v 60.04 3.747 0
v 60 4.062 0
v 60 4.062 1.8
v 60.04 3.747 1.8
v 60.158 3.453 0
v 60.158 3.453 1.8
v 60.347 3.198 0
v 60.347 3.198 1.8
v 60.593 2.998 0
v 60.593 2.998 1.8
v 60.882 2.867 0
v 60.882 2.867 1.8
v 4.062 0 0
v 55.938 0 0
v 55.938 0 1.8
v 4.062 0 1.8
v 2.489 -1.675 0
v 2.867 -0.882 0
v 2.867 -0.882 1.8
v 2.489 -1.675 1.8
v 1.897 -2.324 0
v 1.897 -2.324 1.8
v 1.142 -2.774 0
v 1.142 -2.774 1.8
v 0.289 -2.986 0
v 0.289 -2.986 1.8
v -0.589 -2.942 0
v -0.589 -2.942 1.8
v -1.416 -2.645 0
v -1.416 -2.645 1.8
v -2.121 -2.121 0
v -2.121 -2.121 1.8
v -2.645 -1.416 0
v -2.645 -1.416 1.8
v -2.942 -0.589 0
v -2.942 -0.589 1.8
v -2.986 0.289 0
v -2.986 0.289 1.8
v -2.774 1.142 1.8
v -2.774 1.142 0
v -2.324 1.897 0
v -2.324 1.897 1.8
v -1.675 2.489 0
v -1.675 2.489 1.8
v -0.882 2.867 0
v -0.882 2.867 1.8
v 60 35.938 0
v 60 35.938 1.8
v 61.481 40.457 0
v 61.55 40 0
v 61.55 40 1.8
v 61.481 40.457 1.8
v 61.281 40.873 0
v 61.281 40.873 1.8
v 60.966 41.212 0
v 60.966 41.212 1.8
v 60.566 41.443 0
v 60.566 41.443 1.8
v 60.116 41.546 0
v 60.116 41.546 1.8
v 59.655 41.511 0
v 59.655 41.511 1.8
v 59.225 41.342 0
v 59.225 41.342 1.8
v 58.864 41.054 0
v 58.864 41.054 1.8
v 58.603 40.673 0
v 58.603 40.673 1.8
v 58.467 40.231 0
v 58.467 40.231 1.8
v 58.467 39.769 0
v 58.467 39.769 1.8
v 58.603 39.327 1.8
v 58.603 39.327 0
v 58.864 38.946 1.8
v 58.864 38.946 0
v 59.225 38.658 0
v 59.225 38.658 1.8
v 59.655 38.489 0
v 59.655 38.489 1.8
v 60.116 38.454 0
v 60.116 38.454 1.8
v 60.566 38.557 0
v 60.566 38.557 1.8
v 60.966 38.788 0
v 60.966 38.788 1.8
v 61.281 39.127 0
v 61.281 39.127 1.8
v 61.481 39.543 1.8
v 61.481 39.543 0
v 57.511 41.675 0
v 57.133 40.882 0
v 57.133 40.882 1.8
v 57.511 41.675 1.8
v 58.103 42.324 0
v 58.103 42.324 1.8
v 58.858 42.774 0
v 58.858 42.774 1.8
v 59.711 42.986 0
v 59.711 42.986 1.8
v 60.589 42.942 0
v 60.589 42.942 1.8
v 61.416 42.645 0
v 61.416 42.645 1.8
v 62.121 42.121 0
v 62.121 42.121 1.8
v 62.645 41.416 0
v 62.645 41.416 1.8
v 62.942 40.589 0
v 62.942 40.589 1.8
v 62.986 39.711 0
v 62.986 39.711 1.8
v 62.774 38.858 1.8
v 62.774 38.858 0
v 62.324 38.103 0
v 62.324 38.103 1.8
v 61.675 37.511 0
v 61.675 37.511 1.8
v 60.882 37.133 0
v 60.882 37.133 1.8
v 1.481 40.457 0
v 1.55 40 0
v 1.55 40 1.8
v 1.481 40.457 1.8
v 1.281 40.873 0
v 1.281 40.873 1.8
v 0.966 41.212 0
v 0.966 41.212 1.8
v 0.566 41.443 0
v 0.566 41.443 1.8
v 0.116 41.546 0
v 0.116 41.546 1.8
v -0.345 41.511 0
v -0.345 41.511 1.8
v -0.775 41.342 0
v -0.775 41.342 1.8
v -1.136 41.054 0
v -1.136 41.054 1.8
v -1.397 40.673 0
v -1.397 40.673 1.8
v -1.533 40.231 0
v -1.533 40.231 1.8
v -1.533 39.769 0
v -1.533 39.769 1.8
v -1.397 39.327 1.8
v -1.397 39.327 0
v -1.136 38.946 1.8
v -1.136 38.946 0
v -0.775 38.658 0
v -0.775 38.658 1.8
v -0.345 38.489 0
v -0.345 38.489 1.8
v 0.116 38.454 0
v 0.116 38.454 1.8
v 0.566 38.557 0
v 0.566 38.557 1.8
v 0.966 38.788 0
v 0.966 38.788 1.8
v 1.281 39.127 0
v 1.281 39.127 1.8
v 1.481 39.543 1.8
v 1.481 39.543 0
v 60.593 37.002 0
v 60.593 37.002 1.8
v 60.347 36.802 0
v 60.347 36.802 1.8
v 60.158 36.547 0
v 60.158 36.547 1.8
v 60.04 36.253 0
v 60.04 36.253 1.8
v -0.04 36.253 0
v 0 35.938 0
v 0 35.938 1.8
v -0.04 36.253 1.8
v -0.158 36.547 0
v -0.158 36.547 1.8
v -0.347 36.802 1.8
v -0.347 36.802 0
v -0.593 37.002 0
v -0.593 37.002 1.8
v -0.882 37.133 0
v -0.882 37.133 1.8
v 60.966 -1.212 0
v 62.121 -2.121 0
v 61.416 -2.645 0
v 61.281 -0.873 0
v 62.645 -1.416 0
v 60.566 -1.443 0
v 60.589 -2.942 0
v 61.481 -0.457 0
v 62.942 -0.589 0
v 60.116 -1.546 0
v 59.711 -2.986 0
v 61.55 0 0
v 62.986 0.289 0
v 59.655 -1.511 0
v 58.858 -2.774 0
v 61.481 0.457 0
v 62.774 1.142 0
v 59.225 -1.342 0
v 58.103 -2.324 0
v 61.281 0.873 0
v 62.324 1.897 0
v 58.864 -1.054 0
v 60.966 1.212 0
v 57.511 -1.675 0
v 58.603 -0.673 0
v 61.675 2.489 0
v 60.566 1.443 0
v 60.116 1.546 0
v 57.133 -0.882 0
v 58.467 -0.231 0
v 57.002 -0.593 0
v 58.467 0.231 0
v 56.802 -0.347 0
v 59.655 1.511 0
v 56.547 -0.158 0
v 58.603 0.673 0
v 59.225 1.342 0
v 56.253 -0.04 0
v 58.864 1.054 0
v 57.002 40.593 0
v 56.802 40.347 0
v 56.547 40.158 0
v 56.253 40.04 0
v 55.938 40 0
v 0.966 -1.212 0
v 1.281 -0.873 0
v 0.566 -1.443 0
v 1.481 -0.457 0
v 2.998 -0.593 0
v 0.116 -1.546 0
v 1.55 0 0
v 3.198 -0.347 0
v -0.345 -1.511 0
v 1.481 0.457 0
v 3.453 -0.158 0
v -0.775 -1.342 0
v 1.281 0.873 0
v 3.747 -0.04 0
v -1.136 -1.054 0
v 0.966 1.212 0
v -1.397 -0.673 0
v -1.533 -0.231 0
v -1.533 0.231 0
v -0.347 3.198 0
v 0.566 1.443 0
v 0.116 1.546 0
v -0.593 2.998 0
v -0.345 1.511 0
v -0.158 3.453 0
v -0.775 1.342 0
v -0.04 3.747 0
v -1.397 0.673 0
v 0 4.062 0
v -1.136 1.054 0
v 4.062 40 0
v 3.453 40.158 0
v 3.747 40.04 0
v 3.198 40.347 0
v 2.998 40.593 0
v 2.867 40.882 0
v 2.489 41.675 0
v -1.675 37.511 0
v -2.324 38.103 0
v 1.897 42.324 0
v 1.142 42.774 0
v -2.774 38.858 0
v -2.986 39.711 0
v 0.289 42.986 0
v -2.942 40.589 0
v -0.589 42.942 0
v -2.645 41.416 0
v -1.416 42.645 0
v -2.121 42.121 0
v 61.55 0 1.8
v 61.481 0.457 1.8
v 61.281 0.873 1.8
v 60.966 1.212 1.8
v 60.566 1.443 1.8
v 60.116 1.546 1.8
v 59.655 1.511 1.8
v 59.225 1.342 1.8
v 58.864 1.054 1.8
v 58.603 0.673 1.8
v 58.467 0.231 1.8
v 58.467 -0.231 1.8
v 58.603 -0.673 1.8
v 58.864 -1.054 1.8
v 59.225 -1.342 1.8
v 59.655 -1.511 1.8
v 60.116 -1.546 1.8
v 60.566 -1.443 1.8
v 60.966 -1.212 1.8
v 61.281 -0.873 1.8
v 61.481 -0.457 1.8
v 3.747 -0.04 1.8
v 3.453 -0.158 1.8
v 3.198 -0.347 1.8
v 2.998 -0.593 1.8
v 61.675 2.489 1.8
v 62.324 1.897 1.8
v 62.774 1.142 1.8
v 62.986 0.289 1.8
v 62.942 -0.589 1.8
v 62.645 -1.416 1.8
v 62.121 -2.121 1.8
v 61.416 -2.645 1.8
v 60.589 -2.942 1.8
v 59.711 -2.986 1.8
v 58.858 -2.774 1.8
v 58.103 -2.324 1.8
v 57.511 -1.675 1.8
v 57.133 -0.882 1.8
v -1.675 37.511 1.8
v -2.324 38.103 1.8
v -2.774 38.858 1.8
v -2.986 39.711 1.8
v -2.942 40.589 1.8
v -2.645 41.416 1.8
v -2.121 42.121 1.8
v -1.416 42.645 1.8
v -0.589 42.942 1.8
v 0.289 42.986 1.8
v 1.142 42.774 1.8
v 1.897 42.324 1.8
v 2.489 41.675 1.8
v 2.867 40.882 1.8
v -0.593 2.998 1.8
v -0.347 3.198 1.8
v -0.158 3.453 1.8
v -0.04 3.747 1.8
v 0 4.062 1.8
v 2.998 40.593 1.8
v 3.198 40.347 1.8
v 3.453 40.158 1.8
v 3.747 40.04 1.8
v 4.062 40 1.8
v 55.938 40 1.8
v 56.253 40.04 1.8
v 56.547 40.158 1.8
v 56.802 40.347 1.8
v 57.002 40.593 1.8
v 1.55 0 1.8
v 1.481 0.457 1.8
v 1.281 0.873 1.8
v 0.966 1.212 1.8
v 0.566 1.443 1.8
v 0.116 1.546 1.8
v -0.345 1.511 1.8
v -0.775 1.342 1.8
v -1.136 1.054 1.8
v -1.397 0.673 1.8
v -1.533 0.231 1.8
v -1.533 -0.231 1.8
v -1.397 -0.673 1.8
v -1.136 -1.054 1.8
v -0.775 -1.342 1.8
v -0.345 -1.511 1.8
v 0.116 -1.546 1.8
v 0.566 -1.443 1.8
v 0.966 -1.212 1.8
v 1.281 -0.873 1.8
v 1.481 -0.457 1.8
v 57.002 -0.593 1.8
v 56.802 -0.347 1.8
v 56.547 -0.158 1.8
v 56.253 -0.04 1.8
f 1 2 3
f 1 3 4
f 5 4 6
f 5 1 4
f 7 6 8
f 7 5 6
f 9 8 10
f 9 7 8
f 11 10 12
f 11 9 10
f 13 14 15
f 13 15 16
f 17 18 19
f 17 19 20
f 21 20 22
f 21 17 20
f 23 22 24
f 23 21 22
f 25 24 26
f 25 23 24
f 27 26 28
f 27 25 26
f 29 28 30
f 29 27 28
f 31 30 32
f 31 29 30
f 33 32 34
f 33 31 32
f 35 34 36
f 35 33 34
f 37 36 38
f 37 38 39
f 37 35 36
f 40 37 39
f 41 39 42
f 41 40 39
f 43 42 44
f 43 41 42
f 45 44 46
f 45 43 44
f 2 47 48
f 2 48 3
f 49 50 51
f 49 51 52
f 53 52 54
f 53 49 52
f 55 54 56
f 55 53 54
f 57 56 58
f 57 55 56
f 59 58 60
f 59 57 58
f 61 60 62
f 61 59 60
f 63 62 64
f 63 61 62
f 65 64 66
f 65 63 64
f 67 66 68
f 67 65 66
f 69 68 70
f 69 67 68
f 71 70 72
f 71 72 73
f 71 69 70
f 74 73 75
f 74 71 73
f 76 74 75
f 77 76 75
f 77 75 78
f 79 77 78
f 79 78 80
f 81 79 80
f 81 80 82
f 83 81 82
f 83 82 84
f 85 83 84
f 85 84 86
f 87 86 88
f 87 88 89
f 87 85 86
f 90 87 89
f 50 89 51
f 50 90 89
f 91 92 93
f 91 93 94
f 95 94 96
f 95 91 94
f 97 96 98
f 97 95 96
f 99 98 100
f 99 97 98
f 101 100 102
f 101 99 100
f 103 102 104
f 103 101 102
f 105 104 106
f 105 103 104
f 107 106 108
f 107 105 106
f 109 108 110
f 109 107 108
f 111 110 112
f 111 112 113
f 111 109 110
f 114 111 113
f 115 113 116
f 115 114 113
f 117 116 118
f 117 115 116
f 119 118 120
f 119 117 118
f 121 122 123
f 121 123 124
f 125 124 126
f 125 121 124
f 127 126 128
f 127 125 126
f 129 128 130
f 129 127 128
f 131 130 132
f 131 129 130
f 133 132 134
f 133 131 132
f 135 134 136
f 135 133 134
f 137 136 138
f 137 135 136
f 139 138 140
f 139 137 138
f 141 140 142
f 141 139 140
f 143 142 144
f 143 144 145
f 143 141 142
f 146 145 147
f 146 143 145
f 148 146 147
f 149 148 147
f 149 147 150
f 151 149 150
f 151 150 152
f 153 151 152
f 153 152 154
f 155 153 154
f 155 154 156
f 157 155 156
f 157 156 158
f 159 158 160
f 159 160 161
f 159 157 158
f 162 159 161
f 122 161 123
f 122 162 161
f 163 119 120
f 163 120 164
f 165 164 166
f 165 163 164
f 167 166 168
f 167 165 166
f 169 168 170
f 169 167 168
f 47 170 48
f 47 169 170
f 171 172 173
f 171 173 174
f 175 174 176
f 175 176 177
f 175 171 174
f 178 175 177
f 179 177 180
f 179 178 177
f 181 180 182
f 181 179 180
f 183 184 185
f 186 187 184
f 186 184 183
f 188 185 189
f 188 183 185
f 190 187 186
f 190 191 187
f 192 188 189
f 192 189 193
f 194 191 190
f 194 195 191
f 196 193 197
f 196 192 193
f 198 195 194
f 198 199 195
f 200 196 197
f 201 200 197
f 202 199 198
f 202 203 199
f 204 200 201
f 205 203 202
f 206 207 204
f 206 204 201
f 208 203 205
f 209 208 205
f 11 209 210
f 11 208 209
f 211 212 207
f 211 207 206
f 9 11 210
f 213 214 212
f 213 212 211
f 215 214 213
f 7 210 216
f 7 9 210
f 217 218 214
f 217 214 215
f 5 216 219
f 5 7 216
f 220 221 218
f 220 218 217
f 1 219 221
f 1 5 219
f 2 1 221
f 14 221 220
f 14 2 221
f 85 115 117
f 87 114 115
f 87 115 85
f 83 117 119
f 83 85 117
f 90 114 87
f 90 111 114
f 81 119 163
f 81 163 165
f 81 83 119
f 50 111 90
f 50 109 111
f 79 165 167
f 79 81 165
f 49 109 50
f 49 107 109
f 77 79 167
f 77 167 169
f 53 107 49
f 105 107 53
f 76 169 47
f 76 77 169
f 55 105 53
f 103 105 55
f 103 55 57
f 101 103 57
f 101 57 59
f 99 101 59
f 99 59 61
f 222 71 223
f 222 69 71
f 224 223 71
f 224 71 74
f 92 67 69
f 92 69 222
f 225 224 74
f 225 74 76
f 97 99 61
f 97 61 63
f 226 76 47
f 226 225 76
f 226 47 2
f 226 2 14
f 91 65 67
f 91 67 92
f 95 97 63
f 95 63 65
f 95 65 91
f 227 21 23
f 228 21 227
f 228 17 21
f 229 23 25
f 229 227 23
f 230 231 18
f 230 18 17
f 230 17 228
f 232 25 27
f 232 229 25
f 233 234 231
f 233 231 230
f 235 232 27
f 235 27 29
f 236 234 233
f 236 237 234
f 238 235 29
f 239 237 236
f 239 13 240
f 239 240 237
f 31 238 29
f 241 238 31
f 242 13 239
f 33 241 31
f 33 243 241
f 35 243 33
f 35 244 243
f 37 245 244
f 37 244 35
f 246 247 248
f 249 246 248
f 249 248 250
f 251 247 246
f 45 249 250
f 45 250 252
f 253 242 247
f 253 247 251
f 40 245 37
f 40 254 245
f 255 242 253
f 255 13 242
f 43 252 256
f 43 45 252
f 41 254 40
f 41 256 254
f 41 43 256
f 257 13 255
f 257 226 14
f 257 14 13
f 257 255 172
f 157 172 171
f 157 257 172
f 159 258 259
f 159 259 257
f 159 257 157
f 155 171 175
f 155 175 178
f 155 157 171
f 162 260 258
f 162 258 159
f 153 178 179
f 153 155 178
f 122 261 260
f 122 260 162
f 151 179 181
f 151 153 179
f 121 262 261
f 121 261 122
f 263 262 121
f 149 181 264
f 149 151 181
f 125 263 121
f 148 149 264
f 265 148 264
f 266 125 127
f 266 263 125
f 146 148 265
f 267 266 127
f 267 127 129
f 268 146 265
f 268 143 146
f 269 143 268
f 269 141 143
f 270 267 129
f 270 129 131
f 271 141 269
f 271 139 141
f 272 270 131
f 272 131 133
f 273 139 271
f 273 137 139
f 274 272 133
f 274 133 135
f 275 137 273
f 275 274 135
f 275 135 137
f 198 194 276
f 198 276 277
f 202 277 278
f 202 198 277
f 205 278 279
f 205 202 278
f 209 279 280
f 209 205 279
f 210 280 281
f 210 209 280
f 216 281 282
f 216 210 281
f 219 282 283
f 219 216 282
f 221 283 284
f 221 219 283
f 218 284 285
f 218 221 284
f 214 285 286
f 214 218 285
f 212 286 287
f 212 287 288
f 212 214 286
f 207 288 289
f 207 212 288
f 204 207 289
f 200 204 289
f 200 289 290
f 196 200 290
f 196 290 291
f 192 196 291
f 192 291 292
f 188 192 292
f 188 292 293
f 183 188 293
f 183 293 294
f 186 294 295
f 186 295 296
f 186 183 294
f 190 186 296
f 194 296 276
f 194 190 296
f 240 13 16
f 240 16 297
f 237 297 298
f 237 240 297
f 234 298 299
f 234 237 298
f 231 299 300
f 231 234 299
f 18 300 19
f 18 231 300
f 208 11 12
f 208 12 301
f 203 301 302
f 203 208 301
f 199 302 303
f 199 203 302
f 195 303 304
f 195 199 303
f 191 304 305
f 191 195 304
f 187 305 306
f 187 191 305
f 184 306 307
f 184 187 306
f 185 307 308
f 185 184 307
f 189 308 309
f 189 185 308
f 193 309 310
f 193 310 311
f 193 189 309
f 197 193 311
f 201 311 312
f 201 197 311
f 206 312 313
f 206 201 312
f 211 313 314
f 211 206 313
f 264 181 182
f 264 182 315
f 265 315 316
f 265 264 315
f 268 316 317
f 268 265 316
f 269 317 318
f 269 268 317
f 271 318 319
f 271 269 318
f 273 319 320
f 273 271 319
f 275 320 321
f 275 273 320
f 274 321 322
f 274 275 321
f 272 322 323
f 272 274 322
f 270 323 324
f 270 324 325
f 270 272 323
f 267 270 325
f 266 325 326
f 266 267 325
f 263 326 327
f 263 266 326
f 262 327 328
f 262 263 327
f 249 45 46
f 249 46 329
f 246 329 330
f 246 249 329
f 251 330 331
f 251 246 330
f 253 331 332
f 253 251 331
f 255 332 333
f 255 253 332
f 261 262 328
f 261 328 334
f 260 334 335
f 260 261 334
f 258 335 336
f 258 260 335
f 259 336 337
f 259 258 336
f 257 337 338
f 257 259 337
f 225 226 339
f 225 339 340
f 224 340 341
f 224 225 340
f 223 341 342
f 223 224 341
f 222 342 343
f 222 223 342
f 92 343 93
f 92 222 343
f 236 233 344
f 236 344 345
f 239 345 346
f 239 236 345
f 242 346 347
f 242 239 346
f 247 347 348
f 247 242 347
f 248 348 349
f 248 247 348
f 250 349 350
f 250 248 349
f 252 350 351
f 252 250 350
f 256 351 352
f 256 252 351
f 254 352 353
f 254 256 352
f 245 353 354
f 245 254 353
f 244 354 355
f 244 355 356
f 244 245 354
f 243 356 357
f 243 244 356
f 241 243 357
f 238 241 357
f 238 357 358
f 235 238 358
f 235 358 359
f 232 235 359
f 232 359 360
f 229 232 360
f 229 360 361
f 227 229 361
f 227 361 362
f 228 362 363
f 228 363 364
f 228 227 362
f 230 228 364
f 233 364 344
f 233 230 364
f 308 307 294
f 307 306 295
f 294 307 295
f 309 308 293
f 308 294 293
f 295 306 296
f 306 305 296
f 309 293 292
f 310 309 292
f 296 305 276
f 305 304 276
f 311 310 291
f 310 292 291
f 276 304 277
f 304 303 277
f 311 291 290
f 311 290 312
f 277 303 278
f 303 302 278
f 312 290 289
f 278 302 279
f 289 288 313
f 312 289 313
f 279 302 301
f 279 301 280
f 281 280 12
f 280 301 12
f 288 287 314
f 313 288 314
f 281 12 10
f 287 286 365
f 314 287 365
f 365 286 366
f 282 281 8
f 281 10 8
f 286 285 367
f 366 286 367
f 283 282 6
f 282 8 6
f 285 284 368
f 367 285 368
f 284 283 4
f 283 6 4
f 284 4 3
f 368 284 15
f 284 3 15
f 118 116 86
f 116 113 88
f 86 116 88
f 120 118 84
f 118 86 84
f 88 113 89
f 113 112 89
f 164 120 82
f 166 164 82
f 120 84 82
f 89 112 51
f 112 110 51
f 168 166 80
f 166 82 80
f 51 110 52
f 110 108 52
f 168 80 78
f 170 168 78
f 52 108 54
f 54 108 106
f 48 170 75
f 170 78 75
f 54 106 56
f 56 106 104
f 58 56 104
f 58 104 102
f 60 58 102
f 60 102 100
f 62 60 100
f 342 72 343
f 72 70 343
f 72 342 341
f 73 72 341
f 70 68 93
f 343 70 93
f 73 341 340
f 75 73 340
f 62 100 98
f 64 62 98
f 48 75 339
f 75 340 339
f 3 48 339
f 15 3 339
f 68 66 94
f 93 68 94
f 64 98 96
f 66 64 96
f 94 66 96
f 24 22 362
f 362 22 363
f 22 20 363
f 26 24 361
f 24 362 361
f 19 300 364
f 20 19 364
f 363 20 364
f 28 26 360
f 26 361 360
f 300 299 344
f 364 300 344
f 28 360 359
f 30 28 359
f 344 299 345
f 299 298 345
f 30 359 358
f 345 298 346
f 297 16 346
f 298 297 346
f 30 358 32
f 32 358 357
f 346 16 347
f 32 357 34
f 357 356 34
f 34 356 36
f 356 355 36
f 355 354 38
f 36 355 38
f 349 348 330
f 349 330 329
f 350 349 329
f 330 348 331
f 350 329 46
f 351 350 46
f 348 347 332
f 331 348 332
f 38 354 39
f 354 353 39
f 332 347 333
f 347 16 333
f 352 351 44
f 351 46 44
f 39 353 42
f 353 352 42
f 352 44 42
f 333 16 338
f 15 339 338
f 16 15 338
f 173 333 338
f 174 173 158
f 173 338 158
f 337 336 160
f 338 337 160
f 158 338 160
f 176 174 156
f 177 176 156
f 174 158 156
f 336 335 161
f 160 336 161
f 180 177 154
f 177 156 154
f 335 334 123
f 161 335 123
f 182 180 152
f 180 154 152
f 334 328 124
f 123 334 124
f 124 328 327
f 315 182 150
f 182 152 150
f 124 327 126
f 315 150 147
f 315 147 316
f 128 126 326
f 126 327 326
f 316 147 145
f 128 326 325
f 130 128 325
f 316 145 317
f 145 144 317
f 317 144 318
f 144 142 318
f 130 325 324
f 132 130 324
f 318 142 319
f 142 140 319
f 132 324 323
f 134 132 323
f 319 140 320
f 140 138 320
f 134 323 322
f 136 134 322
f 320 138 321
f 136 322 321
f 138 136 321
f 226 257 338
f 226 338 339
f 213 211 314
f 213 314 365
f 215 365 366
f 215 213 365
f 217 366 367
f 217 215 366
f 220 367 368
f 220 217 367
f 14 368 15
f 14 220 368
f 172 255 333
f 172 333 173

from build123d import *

# Parameters (mm, degrees)
SKETCH_1_R      = 1.55
EXTRUDE_1_DEPTH = 1.8


with BuildPart() as part:
    # 草图1 → 凸台-拉伸1 (new body)
    with BuildSketch(Plane.XY):
        with BuildLine():
            ThreePointArc((0, 35.937980798), (-0.244500417, 36.680591455), (-0.882352941, 37.132692328))
            ThreePointArc((-0.882352941, 37.132692328), (-2.121320344, 42.121320344), (2.867307672, 40.882352941))
            ThreePointArc((2.867307672, 40.882352941), (3.319408545, 40.244500417), (4.062019202, 40))
            Line((4.062019202, 40), (55.937980798, 40))
            ThreePointArc((55.937980798, 40), (56.680591455, 40.244500417), (57.132692328, 40.882352941))
            ThreePointArc((57.132692328, 40.882352941), (62.121320344, 42.121320344), (60.882352941, 37.132692328))
            ThreePointArc((60.882352941, 37.132692328), (60.244500417, 36.680591455), (60, 35.937980798))
            Line((60, 35.937980798), (60, 4.062019202))
            ThreePointArc((60, 4.062019202), (60.244500417, 3.319408545), (60.882352941, 2.867307672))
            ThreePointArc((60.882352941, 2.867307672), (62.121320344, -2.121320344), (57.132692328, -0.882352941))
            ThreePointArc((57.132692328, -0.882352941), (56.680591455, -0.244500417), (55.937980798, 0))
            Line((55.937980798, 0), (4.062019202, 0))
            ThreePointArc((4.062019202, 0), (3.319408545, -0.244500417), (2.867307672, -0.882352941))
            ThreePointArc((2.867307672, -0.882352941), (-2.121320344, -2.121320344), (-0.882352941, 2.867307672))
            ThreePointArc((-0.882352941, 2.867307672), (-0.244500417, 3.319408545), (0, 4.062019202))
            Line((0, 4.062019202), (0, 35.937980798))
        make_face()
        Circle(SKETCH_1_R, mode=Mode.SUBTRACT)
        with Locations((60, 0)):
            Circle(SKETCH_1_R, mode=Mode.SUBTRACT)
        with Locations((60, 40)):
            Circle(SKETCH_1_R, mode=Mode.SUBTRACT)
        with Locations((0, 40)):
            Circle(SKETCH_1_R, mode=Mode.SUBTRACT)
    extrude(amount=EXTRUDE_1_DEPTH)


solid = part.part
